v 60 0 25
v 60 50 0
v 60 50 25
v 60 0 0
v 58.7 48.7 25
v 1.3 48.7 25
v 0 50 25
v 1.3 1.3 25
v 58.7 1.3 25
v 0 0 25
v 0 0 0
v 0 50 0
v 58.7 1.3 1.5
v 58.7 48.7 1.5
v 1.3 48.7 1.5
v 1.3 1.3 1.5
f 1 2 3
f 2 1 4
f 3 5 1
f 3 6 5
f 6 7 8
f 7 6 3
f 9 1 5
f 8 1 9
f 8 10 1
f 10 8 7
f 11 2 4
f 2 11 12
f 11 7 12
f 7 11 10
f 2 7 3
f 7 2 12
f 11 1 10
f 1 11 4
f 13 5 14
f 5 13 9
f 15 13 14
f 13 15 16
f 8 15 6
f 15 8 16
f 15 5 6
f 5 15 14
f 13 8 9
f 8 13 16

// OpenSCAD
$fn = 32;

// ----------------------------------------------------------------------
// Open box: 1.3 mm walls
// ----------------------------------------------------------------------

// --- parameters (mm) ---
box_l = 60;               // outer length, X
box_w = 50;               // outer width, Y
box_h = 25;               // outer height, Z
wall = 1.3;               // wall thickness
floor = 1.5;              // floor thickness

difference() {
  cube([box_l, box_w, box_h]);
  translate([wall, wall, floor])
    cube([box_l - 2 * wall, box_w - 2 * wall, box_h]);
}
